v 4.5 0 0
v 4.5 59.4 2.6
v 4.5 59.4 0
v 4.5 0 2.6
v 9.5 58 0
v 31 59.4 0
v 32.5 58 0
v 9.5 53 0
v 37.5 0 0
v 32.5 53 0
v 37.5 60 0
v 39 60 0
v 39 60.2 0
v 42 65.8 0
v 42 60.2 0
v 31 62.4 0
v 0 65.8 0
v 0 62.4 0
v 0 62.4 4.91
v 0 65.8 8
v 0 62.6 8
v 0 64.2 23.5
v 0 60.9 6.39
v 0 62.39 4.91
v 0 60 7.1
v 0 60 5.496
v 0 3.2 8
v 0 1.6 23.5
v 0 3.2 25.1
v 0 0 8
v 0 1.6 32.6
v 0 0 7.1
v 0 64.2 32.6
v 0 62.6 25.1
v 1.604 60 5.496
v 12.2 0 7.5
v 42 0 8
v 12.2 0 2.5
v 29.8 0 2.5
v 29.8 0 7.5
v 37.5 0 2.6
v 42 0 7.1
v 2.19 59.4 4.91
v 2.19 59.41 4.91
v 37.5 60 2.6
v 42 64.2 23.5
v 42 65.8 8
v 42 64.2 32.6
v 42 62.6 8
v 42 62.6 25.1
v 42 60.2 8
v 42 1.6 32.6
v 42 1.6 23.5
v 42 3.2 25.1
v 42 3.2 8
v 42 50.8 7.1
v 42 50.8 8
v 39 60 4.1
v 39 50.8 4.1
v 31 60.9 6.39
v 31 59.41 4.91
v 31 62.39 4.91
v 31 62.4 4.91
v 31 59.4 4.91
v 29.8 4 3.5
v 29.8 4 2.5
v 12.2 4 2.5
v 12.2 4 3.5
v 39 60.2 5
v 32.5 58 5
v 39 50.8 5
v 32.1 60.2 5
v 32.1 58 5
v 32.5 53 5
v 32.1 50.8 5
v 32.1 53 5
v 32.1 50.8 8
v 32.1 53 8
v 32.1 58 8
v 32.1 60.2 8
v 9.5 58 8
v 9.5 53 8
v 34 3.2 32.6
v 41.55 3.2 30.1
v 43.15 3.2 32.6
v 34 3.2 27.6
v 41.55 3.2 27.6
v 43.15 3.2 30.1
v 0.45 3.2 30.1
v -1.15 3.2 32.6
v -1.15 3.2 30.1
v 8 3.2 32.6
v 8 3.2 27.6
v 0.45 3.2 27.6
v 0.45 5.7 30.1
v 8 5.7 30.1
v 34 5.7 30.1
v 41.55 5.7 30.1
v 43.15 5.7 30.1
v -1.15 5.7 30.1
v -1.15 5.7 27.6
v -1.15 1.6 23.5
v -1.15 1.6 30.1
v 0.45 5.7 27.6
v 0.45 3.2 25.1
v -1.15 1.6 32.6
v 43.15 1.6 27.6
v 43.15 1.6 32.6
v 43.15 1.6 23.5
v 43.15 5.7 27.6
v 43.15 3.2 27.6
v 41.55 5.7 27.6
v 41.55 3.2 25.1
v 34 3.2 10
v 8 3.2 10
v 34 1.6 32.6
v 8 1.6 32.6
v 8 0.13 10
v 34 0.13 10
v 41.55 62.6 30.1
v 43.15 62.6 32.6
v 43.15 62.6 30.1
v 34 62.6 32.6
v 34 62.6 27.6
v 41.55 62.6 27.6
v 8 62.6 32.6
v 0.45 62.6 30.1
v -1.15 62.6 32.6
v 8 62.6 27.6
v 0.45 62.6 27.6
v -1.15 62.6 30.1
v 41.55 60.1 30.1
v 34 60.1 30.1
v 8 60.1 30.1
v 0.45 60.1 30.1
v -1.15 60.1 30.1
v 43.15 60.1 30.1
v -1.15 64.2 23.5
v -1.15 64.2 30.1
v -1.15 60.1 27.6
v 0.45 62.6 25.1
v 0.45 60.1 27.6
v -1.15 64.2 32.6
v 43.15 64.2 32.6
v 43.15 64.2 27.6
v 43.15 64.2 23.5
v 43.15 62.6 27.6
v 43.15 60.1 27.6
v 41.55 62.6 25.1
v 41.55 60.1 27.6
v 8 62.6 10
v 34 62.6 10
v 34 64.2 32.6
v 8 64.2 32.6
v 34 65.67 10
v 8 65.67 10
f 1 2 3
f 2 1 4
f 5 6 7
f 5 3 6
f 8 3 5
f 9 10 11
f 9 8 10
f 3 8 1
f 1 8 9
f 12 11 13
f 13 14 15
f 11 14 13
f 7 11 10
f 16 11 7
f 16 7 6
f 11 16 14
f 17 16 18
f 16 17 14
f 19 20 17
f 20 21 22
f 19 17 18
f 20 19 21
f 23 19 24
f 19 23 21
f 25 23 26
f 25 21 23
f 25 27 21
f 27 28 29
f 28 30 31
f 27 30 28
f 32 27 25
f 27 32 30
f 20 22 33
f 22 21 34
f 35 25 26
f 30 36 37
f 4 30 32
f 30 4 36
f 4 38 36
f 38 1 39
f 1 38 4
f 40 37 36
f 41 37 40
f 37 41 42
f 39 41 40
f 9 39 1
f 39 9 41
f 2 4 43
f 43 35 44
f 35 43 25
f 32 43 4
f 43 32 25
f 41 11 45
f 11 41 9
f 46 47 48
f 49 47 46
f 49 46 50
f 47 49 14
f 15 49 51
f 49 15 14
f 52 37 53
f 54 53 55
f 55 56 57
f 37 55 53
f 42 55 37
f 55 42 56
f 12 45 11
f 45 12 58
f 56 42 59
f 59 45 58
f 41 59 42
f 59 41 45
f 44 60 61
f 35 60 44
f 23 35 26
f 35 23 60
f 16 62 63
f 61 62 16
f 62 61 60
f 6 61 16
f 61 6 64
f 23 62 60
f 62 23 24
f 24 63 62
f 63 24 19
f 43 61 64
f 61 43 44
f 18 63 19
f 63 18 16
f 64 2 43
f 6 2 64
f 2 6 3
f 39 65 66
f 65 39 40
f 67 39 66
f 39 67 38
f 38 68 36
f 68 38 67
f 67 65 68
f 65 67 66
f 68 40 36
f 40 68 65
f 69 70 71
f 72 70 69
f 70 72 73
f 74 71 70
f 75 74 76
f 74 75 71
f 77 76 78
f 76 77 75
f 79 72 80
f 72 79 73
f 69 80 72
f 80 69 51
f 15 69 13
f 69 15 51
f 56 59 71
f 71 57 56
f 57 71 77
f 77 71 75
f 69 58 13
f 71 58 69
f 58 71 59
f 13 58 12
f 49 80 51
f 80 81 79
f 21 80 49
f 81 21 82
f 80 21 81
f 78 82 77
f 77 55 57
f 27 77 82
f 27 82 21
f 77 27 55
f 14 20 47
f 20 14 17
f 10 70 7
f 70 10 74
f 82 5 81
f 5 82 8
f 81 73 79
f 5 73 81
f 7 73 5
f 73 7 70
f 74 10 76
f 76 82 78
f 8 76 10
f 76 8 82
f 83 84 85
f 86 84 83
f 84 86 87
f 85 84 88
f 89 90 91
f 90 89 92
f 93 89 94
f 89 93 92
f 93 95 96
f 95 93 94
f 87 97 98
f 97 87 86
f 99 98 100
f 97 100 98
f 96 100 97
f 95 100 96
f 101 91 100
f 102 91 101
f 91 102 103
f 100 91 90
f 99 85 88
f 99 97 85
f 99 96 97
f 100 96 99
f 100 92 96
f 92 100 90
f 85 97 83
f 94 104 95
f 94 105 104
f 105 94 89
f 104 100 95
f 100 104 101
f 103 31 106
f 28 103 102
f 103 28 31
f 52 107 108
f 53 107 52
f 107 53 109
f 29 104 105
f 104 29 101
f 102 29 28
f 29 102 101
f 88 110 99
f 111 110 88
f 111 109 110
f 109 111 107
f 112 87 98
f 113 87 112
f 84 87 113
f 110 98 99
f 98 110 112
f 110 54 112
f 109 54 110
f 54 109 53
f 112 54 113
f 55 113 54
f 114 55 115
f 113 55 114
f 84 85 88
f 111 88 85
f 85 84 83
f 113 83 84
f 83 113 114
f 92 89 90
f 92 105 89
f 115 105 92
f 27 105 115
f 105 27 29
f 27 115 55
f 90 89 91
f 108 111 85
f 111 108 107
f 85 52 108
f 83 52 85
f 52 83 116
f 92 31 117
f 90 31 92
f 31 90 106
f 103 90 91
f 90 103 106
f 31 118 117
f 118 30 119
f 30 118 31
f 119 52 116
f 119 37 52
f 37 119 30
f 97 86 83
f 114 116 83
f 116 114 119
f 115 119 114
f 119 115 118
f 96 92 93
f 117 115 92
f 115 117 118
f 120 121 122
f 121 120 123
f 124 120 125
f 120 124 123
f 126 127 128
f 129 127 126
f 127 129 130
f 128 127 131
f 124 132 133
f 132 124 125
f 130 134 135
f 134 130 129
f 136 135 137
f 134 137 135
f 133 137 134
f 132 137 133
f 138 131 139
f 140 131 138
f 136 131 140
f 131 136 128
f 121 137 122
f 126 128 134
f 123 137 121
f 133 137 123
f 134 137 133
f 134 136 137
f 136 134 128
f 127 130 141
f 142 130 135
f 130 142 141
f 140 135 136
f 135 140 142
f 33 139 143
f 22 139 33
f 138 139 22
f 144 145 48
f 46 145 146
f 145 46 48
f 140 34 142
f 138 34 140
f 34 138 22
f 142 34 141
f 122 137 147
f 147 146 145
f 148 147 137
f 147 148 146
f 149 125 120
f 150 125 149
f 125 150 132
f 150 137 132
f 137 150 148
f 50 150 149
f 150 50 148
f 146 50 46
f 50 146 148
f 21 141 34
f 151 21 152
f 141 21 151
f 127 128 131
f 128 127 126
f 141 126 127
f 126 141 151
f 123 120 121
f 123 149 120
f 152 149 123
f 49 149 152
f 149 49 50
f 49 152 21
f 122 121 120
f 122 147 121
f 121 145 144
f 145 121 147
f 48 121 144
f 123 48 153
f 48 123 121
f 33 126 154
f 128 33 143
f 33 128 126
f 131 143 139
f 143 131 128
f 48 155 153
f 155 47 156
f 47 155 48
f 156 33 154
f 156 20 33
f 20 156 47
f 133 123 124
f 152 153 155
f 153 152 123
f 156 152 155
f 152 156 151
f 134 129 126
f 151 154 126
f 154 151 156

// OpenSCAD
/*
Generic Action Camera Adapter for 3DR Solo
Copyright (C) 2016 - 2017  Hugh Eaves

This program is free software: you can redistribute it and/or modify
it under the terms of the GNU General Public License as published by
the Free Software Foundation, either version 3 of the License, or
(at your option) any later version.

This program is distributed in the hope that it will be useful,
but WITHOUT ANY WARRANTY; without even the implied warranty of
MERCHANTABILITY or FITNESS FOR A PARTICULAR PURPOSE.  See the
GNU General Public License for more details.

You should have received a copy of the GNU General Public License
along with this program.  If not, see <http://www.gnu.org/licenses/>.
*/

/************************************************
* PART SELECTION
************************************************/

// Select the part you would like to display
part = "adapter";// [adapter:Adapter,retaining_clip:Retaining clip,back_weight:Back Weight,side_weight:Side Weight]

/********************
* MAIN PARAMETERS *
********************/

// No-name SJ4000 clone
// camera_length = 59.8;
// camera_width = 40.8;
// camera_height = 25.6;

// The values below are for the GitUp Git2P

/* [Adapter Parameters] */
// Length of camera body (side to side)
camera_length = 59.4;// [57:62]
// Width of camera body (top to bottom)
camera_width = 41.1;// [38:42]
// Height of camera body (front to back)
camera_height = 19.6;// [15:40]

// Adapter arm bump size (How far out the "bumps" protrude on the ends of the arms)
adapter_arm_bump_size = 2.5;// [1:5]

/* [Back Weight Parameters] */
// The length of the counterbalance weight on the back of the camera. Larger values make it heavier.
back_weight_length = 29;// [10:40]

// The offset of the weight on the back of the gimbal. Values greater than zero move the weight to the outer side of the gimbal
back_weight_offset = 0;// [0:20]

/* [Side Weight Parameters] */
// The thickness of the side weight, thicker is heavier
side_weight_thickness = 4;// [4:8]

// The length of the side weight, longer is heavier
side_weight_length = 10;// [9:17]

/********************
* OTHER PARAMETERS *
********************/
/* [Hidden] */

/* How much to shift the camera to the right to avoid the curved protrusion from the pitch motor housing */
camera_offset = 3.2;

/* Dimensions of the base of the camera adapter, so that it is a nice snug fit inside the 3DR gimbal mount */
base_height = 8;// (thickness) thick enough to clear the GoPro plug in the back
base_width = 42;
base_length = 60;

/* Dimensions of the small bracket that holds the camera adapter to the gimbal mount */
bracket_width = 9;
bracket_depth = 9.5;
bracket_thickness = 3;
bracket_radius = 2;

/* Typical values for M2 cap-head screws */
screw_thread_diameter = 2.5;
screw_head_diameter = 5;
screw_head_height = 3;

/* Dimensions of the "stud" that the 3DR balancing weights attach to */
stud_height = 2.5;
stud_diameter = 6.4;
stud_hole_diameter = 2;

bottom_lip_width = 4.5;
bottom_lip_height = 2.6;

// cutout for GoPro plug
plug_thickness = 5;
plug_width = 23;
plug_offset = 55.5 - (plug_thickness / 2);

// cutout for right side wall of "gimbal bracket"
side_wall_length = 31;
side_wall_height = 6.4;
side_wall_width = 3;
side_wall_offset = 59.4;

// height of hook on bottom left of "gimbal bracket"
hook_width = 17.6;
hook_height = 2.5;// distance from bottom
hook_length = 4;
hook_thickness = 1;

// width of protrusion on front of "pitch motor"
motor_protrusion_width = 20;

// thickness / length of camera retaining clips
clip_thickness = 1.6;
right_clip_opening_width = 26;
// left_clip_opening_width = motor_protrusion_width;
left_clip_opening_width = right_clip_opening_width;

x_midpoint = base_width / 2;
main_length = camera_length + camera_offset * 2;
camera_gap = (base_width - camera_width) / 2;

camera_height_adjustment = 0;

// more facets for smaller holes
$fn = 16;

module lip_cutout() {
  cube([bottom_lip_width, base_length, bottom_lip_height]);
  translate([0, 0, bottom_lip_height])
    mirror([1, -1, 0])
      wedge(base_length, bottom_lip_width, bottom_lip_width, false, false);
}


module side_wall_cutout() {
  translate([0, side_wall_offset, 0]) {
    cutout_base_height = side_wall_height - (side_wall_width / 2);
    cube([side_wall_length, side_wall_width, cutout_base_height + 0.01]);
    translate([0, 0, cutout_base_height])
      prism(side_wall_length, side_wall_width, side_wall_width / 2 - 0.01);
  }
}

module hook_cutout() {
  translate([x_midpoint - hook_width / 2, 0, hook_height]) {
    cube([hook_width, hook_length, hook_thickness]);
    translate([0, 0, hook_thickness])
      wedge(hook_width, hook_length, hook_length, false);
  }
}

module bracket_cutout() {
  bracket_clearance = 0.4;
  adj_bracket_width = bracket_width + bracket_clearance;
  adj_bracket_depth = bracket_depth + bracket_clearance;
  translate([base_width - bracket_depth, base_length + bracket_clearance / 2 - adj_bracket_width, 0]) {
    translate([-bracket_clearance, 0, base_height - bracket_thickness])
      cube([adj_bracket_depth, adj_bracket_width, bracket_thickness + 5]);
    translate([bracket_depth - bracket_thickness, 0, 0])
      cube([bracket_depth, adj_bracket_width, base_height]);
  }

}

module clip_corner(length) {

  cube([clip_thickness, length + clip_thickness, length]);
  wedge(clip_thickness, length + clip_thickness, length + clip_thickness, false, true);

}


module clip(length) {
  cube([base_width, clip_thickness, camera_height]);
  translate([-clip_thickness + camera_gap, 0, camera_height])
    cube([camera_width + clip_thickness * 2, clip_thickness, length * 2 + camera_height_adjustment]);
  translate([-clip_thickness + camera_gap, clip_thickness, camera_height + camera_height_adjustment])
    mirror([0, 1, -1])
      prism(camera_width + clip_thickness * 2, length * 2, length);
  //   cube([camera_width+clip_thickness*2, length + clip_thickness, clip_thickness ]);
  wedge(base_width, camera_offset - clip_thickness, camera_height + length * 2 + camera_height_adjustment, true, false);
  translate([0, 0, camera_height + adapter_arm_bump_size + camera_height_adjustment - length]) {
    translate([-clip_thickness + camera_gap, 0, 0])
      clip_corner(length);
    translate([base_width - camera_gap, 0, 0])
      clip_corner(length);
  }
}

module left_clip() {
  translate([0, camera_offset - clip_thickness, base_height]) {
    difference() {
      clip(adapter_arm_bump_size);
      translate([x_midpoint - left_clip_opening_width / 2, -clip_thickness, 2])
        cube([left_clip_opening_width, adapter_arm_bump_size + clip_thickness * 2, camera_height + adapter_arm_bump_size * 2]);
    }
  }
}

module right_clip() {
  translate([0, camera_length + camera_offset + clip_thickness, base_height]) {
    mirror([0, 1, 0])
      difference() {
        clip(adapter_arm_bump_size);
        translate([x_midpoint - right_clip_opening_width / 2, -clip_thickness, 2])
          cube([right_clip_opening_width, adapter_arm_bump_size + clip_thickness * 2, camera_height + adapter_arm_bump_size * 2]);
      }
  }
}

module prism(x, y, z, upside_down) {
  translate([0, y / 2, 0]) {
    wedge(x, y / 2, z, true, upside_down);
    wedge(x, y / 2, z, false, upside_down);
  }
}

module wedge(x, y, z, reverse, upside_down) {
  ly = reverse ? -y : y;
  lz = upside_down ? -z : z;
  polyhedron(points = [
    [0, 0, 0], 
    [x, 0, 0], 
    [x, ly, 0], 
    [0, ly, 0], 
    [0, 0, lz], 
    [x, 0, lz]
  ], faces = [
    [0, 1, 2, 3], 
    [5, 4, 3, 2], 
    [0, 4, 5, 1], 
    [0, 3, 4], 
    [5, 2, 1]
  ]);
}

module weight_stud() {
  difference() {
    cylinder(d = stud_diameter - 0.4, h = stud_height, $fn = 32);
    cylinder(d = stud_hole_diameter, h = stud_height, $fn = 16);
  }
}


/********************************************
* Top level function to render the adapter
********************************************/
module adapter() {

  difference() {
    cube([base_width, main_length, base_height]);

    lip_cutout();

    translate([base_width, 0, 0])
      mirror([-1, 0, 0])
        lip_cutout();

    side_wall_cutout();

    translate([x_midpoint - plug_width / 2, plug_offset, 0])
      cube([plug_width, plug_thickness, base_height]);

    hook_cutout();

    bracket_cutout();
  }

  left_clip();
  right_clip();

}

/********************************************
* Top level function to render the retaining clip
********************************************/
module retaining_clip() {
  bracket_inside_height = 11.4 + base_height - bracket_thickness;

  difference() {
    union() {
      hull() {
        cube([bracket_width, bracket_thickness, bracket_depth + bracket_thickness - bracket_radius]);
        cube([1, bracket_thickness, bracket_depth + bracket_thickness]);
        translate([bracket_width - bracket_radius, 0, bracket_depth + bracket_thickness - bracket_radius])
          mirror([0, -1, 1])
            cylinder(r = bracket_radius, h = bracket_thickness);
      }
      translate([0, bracket_inside_height + bracket_thickness, 0])
        cube([bracket_width, bracket_thickness, bracket_depth + bracket_thickness]);
      translate([0, bracket_thickness, 0])
        cube([bracket_width, bracket_inside_height, bracket_thickness * 2]);
    }

    translate([bracket_width - 3, bracket_thickness, bracket_thickness - 0.2])
      cube([2, bracket_inside_height, bracket_depth]);
    translate([bracket_width - 3.6, 0, bracket_depth + bracket_thickness - 2.8])
      mirror([0, -1, 1]) {
        translate([0, 0, -bracket_thickness / 2])
          cylinder(d = 4, h = bracket_thickness);
        translate([0, 0, bracket_thickness / 2])
          cylinder(d = 2, h = bracket_thickness);
      }
  }
}

/********************************************
* Top level function to render the back / counterbalance weight
********************************************/
module back_weight() {
  thickness = 2;
  length = 57.8;
  width = 34;
  weight_thickness = 100;

  intersection() {
    difference() {
      union() {
        cube([length, width, thickness]);
        translate([back_weight_offset, 0, -weight_thickness])
          cube([back_weight_length, width, weight_thickness]);
        translate([12, 0, thickness])
          cube([3, width, 3.4]);
        translate([33.6, 0, thickness])
          cube([3, width, 4]);
        translate([54.8, 8, thickness])
          cube([3, width - 8, 4]);

        translate([36, 0, 0]) {
          translate([4.5, 18, -2])
            cylinder(d = 5, h = 2);
          translate([16.5, 6.75, -2])
            cylinder(d = 5, h = 2);
          translate([13.5, 27, -2])
            cylinder(d = 5, h = 2);
        }

      }
      translate([36, 0, 0]) {
        translate([4.5, 18, -90])
          cylinder(d = screw_thread_diameter, h = 100);
        translate([16.5, 6.75, -90])
          cylinder(d = screw_thread_diameter, h = 100);
        translate([13.5, 27, -90])
          cylinder(d = screw_thread_diameter, h = 100);
      }

    }
    mirror([-1, 0, 1])
      translate([26, width / 2, 0]) {
        cylinder(d = 77, h = 14, $fn = 64);
        translate([0, 0, 14])
          cylinder(d = 70, h = 16, $fn = 64);
        translate([0, 0, 30])
          cylinder(d = 77, h = 100, $fn = 64);
      }
  }
}

module curve_cutout(beam_curve_diameter, beam_thickness) {
  difference() {
    cylinder(d = beam_curve_diameter, h = 100, $fn = 64);
    cylinder(d = beam_curve_diameter - (beam_thickness * 2), h = 100, $fn = 64);
  }
}

/********************************************
* Top level function to render the side weight
********************************************/
module side_weight() {

  side_weight_width = 2;

  beam_curve_diameter = 34;
  beam_thickness = 1.2;
  beam_height = 4;
  beam_width = 5.7;
  beam_length = beam_curve_diameter / 2;

  bracket_length = beam_length;
  bracket_width = beam_width + side_weight_width + beam_thickness;
  bracket_height = beam_height + side_weight_thickness;
  bracket_depth = 3;

  difference() {
    union() {
      difference() {
        cube([bracket_length, bracket_width, bracket_height]);

        translate([0, beam_curve_diameter / 2 + side_weight_width, side_weight_thickness])
          curve_cutout(beam_curve_diameter, beam_thickness);

        translate([bracket_length - screw_head_diameter / 2 - 1, bracket_width / 2 - 1, 0]) {

          cylinder(d = screw_head_diameter, h = screw_head_height);
          cylinder(d = screw_thread_diameter, h = bracket_height);
        }
      }
      translate([-side_weight_length, 0, 0])
        difference() {
          cube([side_weight_length, bracket_width, bracket_height]);

          translate([0, side_weight_width, side_weight_thickness])
            cube([side_weight_length, beam_thickness, 100]);
        }
    }
  }
}

// Call the top level rendering function based on "part"
if (part == "adapter") {
  adapter();
} else if (part == "back_weight") {
  back_weight();
} else if (part == "retaining_clip") {
  retaining_clip();
} else if (part == "side_weight") {
  side_weight();
  translate([0, 20, 0])
    mirror([1, 0, 0])
      side_weight();
}
